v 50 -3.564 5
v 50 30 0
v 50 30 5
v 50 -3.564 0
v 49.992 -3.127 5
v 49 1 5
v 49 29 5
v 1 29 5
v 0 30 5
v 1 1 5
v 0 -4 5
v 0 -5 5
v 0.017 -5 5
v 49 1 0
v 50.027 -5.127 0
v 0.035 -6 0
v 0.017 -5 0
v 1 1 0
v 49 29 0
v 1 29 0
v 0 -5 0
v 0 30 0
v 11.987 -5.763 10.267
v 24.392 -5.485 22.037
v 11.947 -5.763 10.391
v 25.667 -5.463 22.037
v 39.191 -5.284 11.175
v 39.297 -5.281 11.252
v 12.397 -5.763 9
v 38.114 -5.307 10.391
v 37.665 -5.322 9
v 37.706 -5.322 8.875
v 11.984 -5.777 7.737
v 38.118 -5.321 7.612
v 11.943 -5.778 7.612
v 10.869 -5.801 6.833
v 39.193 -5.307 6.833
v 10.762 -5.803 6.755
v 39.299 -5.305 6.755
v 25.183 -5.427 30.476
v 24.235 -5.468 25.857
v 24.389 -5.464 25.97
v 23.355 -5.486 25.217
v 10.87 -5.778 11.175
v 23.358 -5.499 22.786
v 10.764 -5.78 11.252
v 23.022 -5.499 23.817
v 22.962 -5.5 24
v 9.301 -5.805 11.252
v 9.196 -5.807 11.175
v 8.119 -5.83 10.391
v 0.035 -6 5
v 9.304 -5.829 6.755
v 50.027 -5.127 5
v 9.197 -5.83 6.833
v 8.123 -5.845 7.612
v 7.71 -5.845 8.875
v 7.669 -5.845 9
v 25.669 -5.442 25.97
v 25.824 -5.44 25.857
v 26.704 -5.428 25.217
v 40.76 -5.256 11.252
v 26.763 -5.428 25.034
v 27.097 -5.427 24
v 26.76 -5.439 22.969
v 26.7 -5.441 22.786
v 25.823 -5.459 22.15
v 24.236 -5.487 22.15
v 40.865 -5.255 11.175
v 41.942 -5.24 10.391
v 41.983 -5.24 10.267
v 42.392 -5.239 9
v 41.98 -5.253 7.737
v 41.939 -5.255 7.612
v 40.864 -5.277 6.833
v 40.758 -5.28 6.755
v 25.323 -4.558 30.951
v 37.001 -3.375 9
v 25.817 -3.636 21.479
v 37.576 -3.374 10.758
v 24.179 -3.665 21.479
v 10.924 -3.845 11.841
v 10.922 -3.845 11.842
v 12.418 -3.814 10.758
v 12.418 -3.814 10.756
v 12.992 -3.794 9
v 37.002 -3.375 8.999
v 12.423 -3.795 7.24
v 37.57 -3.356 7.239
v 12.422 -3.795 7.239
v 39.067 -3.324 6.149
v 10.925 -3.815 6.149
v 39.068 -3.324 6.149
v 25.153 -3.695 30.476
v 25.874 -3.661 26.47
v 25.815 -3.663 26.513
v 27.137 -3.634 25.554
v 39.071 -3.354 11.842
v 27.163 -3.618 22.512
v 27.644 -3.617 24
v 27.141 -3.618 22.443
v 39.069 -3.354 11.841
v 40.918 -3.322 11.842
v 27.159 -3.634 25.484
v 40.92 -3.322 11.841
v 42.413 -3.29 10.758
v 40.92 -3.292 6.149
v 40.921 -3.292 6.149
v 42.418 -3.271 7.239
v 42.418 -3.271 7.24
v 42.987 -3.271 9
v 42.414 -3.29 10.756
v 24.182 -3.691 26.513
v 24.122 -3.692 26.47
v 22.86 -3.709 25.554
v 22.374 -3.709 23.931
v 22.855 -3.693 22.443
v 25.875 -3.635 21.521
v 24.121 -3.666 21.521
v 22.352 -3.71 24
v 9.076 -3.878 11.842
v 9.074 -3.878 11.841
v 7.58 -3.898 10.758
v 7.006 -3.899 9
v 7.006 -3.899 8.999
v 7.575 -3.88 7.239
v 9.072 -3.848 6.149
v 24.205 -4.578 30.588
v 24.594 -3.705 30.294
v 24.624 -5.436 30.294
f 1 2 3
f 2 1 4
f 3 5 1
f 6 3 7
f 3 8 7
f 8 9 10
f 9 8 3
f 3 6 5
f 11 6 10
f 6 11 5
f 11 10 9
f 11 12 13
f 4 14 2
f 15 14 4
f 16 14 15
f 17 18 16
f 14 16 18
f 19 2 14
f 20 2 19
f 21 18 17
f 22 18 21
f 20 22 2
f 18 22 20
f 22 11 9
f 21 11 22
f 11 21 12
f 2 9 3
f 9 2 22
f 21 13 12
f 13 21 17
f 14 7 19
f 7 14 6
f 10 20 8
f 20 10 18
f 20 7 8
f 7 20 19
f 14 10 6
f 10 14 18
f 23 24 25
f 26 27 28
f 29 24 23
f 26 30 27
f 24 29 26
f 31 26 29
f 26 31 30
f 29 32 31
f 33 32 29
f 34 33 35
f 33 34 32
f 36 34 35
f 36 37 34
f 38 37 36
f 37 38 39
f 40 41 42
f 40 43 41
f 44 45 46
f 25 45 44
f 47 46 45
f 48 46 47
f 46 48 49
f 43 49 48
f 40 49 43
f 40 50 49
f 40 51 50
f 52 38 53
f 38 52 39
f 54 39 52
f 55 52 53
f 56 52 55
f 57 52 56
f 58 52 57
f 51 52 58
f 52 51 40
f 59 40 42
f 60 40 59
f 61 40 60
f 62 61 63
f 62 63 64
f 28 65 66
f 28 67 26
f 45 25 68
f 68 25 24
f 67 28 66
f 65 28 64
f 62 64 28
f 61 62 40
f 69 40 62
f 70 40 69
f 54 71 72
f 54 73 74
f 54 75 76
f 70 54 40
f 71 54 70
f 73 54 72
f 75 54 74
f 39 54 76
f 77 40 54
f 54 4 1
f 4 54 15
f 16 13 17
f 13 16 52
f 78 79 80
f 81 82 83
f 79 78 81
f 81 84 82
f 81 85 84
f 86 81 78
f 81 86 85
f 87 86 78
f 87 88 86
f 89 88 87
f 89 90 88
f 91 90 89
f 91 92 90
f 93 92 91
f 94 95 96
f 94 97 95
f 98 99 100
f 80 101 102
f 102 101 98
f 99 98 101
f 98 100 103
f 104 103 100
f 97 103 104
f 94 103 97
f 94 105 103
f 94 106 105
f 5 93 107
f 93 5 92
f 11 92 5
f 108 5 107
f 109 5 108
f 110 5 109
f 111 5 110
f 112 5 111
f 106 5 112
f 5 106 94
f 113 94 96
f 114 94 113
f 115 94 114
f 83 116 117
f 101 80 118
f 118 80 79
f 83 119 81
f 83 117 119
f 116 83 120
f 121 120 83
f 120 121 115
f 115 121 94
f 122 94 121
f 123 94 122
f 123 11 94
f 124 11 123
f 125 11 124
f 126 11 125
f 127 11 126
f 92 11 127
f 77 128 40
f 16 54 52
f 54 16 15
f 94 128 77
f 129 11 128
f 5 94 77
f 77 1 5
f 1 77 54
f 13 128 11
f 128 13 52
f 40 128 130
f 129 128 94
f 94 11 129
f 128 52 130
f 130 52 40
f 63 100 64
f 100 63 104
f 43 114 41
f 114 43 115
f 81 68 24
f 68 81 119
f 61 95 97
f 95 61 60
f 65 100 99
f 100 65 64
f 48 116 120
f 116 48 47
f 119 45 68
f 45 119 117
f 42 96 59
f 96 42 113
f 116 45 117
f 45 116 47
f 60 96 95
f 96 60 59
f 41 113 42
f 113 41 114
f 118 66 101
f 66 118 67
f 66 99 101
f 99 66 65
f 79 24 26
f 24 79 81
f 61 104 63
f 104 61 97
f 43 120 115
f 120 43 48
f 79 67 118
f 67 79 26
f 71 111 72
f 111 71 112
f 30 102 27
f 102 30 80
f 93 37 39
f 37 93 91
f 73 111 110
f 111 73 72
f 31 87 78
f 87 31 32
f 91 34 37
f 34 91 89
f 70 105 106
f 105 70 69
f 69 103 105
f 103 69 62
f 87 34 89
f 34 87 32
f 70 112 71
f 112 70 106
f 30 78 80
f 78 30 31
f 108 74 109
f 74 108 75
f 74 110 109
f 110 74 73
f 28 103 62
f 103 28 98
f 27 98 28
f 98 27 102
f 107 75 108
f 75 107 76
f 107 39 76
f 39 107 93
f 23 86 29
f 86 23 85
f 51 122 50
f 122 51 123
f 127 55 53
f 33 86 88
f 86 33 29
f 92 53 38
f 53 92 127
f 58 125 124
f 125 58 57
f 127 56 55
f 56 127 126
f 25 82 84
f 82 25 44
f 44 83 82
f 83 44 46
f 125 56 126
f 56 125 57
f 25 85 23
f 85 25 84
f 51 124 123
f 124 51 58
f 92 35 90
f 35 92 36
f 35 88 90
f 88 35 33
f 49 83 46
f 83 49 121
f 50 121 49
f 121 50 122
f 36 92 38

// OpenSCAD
// Part 1: cassetta Lenti 

/// VARIABLES
height=5; //support height
width=50; //support width
depth=30; //support depth
box_height=50; //height of boxes
large_box_width=30; // the little one will be calculated by difference
thickness=1;
screw_head=3;
delta_mount_y=4;

// CALCULATED VARIABLES
invito=screw_head/4;
delta_wall=delta_mount_y+thickness;
small_box_width=width-large_box_width-4*thickness; // the little one will be calculated by difference
depth_boxes=depth-4*thickness;


// Porta Lenti grande
*rotate([180,0,0])
translate([1.5*thickness,thickness+1,-box_height+height+thickness])
difference(){
    union(){ translate([0,0,0])
            cube([large_box_width,depth_boxes,box_height]);
            translate([-2*thickness,-2*thickness,box_height])
            cube([large_box_width+(2*thickness),depth_boxes+(4*thickness),thickness]);}
   translate([thickness,thickness,thickness])
        cube([large_box_width-(2*thickness),depth_boxes-(2*thickness),box_height+8*thickness]);}

// Porta Lenti piccolo
*rotate([180,0,0])
translate([large_box_width+2.5*thickness,thickness+1,-box_height+height+thickness])
difference(){
    union(){ translate([0,0,0])
            cube([small_box_width,depth_boxes,box_height]);
            translate([-0*thickness,-2*thickness,box_height])
            cube([small_box_width+(2*thickness),depth_boxes+(4*thickness),thickness]);}
   translate([thickness,thickness,thickness])
        cube([small_box_width-(2*thickness),depth_boxes-(2*thickness),box_height+8*thickness]);}



// Inizio Struttura

// Porta Lenti
difference(){
    translate([0,-delta_wall,0])
        cube([width,depth+delta_wall,height]);
    translate([thickness,thickness,-1])
        cube([width-(2*thickness),depth-(2*thickness),height+2]);}


// Wall mount
translate([0,thickness-delta_wall,0])
rotate([90,0,1]) 
difference(){
    hull(){
        cube([width,height,thickness*2]);
        translate([width/2,depth,thickness]) sphere(thickness);}
    translate([width/2,depth*0.8,-1]) cylinder(height+2,screw_head,invito);
    translate([width*.8,depth*0.30]) cylinder(height+2,screw_head,invito);
    translate([width*.2,depth*0.30]) cylinder(height+2,screw_head,invito);
    }
    
    
    
